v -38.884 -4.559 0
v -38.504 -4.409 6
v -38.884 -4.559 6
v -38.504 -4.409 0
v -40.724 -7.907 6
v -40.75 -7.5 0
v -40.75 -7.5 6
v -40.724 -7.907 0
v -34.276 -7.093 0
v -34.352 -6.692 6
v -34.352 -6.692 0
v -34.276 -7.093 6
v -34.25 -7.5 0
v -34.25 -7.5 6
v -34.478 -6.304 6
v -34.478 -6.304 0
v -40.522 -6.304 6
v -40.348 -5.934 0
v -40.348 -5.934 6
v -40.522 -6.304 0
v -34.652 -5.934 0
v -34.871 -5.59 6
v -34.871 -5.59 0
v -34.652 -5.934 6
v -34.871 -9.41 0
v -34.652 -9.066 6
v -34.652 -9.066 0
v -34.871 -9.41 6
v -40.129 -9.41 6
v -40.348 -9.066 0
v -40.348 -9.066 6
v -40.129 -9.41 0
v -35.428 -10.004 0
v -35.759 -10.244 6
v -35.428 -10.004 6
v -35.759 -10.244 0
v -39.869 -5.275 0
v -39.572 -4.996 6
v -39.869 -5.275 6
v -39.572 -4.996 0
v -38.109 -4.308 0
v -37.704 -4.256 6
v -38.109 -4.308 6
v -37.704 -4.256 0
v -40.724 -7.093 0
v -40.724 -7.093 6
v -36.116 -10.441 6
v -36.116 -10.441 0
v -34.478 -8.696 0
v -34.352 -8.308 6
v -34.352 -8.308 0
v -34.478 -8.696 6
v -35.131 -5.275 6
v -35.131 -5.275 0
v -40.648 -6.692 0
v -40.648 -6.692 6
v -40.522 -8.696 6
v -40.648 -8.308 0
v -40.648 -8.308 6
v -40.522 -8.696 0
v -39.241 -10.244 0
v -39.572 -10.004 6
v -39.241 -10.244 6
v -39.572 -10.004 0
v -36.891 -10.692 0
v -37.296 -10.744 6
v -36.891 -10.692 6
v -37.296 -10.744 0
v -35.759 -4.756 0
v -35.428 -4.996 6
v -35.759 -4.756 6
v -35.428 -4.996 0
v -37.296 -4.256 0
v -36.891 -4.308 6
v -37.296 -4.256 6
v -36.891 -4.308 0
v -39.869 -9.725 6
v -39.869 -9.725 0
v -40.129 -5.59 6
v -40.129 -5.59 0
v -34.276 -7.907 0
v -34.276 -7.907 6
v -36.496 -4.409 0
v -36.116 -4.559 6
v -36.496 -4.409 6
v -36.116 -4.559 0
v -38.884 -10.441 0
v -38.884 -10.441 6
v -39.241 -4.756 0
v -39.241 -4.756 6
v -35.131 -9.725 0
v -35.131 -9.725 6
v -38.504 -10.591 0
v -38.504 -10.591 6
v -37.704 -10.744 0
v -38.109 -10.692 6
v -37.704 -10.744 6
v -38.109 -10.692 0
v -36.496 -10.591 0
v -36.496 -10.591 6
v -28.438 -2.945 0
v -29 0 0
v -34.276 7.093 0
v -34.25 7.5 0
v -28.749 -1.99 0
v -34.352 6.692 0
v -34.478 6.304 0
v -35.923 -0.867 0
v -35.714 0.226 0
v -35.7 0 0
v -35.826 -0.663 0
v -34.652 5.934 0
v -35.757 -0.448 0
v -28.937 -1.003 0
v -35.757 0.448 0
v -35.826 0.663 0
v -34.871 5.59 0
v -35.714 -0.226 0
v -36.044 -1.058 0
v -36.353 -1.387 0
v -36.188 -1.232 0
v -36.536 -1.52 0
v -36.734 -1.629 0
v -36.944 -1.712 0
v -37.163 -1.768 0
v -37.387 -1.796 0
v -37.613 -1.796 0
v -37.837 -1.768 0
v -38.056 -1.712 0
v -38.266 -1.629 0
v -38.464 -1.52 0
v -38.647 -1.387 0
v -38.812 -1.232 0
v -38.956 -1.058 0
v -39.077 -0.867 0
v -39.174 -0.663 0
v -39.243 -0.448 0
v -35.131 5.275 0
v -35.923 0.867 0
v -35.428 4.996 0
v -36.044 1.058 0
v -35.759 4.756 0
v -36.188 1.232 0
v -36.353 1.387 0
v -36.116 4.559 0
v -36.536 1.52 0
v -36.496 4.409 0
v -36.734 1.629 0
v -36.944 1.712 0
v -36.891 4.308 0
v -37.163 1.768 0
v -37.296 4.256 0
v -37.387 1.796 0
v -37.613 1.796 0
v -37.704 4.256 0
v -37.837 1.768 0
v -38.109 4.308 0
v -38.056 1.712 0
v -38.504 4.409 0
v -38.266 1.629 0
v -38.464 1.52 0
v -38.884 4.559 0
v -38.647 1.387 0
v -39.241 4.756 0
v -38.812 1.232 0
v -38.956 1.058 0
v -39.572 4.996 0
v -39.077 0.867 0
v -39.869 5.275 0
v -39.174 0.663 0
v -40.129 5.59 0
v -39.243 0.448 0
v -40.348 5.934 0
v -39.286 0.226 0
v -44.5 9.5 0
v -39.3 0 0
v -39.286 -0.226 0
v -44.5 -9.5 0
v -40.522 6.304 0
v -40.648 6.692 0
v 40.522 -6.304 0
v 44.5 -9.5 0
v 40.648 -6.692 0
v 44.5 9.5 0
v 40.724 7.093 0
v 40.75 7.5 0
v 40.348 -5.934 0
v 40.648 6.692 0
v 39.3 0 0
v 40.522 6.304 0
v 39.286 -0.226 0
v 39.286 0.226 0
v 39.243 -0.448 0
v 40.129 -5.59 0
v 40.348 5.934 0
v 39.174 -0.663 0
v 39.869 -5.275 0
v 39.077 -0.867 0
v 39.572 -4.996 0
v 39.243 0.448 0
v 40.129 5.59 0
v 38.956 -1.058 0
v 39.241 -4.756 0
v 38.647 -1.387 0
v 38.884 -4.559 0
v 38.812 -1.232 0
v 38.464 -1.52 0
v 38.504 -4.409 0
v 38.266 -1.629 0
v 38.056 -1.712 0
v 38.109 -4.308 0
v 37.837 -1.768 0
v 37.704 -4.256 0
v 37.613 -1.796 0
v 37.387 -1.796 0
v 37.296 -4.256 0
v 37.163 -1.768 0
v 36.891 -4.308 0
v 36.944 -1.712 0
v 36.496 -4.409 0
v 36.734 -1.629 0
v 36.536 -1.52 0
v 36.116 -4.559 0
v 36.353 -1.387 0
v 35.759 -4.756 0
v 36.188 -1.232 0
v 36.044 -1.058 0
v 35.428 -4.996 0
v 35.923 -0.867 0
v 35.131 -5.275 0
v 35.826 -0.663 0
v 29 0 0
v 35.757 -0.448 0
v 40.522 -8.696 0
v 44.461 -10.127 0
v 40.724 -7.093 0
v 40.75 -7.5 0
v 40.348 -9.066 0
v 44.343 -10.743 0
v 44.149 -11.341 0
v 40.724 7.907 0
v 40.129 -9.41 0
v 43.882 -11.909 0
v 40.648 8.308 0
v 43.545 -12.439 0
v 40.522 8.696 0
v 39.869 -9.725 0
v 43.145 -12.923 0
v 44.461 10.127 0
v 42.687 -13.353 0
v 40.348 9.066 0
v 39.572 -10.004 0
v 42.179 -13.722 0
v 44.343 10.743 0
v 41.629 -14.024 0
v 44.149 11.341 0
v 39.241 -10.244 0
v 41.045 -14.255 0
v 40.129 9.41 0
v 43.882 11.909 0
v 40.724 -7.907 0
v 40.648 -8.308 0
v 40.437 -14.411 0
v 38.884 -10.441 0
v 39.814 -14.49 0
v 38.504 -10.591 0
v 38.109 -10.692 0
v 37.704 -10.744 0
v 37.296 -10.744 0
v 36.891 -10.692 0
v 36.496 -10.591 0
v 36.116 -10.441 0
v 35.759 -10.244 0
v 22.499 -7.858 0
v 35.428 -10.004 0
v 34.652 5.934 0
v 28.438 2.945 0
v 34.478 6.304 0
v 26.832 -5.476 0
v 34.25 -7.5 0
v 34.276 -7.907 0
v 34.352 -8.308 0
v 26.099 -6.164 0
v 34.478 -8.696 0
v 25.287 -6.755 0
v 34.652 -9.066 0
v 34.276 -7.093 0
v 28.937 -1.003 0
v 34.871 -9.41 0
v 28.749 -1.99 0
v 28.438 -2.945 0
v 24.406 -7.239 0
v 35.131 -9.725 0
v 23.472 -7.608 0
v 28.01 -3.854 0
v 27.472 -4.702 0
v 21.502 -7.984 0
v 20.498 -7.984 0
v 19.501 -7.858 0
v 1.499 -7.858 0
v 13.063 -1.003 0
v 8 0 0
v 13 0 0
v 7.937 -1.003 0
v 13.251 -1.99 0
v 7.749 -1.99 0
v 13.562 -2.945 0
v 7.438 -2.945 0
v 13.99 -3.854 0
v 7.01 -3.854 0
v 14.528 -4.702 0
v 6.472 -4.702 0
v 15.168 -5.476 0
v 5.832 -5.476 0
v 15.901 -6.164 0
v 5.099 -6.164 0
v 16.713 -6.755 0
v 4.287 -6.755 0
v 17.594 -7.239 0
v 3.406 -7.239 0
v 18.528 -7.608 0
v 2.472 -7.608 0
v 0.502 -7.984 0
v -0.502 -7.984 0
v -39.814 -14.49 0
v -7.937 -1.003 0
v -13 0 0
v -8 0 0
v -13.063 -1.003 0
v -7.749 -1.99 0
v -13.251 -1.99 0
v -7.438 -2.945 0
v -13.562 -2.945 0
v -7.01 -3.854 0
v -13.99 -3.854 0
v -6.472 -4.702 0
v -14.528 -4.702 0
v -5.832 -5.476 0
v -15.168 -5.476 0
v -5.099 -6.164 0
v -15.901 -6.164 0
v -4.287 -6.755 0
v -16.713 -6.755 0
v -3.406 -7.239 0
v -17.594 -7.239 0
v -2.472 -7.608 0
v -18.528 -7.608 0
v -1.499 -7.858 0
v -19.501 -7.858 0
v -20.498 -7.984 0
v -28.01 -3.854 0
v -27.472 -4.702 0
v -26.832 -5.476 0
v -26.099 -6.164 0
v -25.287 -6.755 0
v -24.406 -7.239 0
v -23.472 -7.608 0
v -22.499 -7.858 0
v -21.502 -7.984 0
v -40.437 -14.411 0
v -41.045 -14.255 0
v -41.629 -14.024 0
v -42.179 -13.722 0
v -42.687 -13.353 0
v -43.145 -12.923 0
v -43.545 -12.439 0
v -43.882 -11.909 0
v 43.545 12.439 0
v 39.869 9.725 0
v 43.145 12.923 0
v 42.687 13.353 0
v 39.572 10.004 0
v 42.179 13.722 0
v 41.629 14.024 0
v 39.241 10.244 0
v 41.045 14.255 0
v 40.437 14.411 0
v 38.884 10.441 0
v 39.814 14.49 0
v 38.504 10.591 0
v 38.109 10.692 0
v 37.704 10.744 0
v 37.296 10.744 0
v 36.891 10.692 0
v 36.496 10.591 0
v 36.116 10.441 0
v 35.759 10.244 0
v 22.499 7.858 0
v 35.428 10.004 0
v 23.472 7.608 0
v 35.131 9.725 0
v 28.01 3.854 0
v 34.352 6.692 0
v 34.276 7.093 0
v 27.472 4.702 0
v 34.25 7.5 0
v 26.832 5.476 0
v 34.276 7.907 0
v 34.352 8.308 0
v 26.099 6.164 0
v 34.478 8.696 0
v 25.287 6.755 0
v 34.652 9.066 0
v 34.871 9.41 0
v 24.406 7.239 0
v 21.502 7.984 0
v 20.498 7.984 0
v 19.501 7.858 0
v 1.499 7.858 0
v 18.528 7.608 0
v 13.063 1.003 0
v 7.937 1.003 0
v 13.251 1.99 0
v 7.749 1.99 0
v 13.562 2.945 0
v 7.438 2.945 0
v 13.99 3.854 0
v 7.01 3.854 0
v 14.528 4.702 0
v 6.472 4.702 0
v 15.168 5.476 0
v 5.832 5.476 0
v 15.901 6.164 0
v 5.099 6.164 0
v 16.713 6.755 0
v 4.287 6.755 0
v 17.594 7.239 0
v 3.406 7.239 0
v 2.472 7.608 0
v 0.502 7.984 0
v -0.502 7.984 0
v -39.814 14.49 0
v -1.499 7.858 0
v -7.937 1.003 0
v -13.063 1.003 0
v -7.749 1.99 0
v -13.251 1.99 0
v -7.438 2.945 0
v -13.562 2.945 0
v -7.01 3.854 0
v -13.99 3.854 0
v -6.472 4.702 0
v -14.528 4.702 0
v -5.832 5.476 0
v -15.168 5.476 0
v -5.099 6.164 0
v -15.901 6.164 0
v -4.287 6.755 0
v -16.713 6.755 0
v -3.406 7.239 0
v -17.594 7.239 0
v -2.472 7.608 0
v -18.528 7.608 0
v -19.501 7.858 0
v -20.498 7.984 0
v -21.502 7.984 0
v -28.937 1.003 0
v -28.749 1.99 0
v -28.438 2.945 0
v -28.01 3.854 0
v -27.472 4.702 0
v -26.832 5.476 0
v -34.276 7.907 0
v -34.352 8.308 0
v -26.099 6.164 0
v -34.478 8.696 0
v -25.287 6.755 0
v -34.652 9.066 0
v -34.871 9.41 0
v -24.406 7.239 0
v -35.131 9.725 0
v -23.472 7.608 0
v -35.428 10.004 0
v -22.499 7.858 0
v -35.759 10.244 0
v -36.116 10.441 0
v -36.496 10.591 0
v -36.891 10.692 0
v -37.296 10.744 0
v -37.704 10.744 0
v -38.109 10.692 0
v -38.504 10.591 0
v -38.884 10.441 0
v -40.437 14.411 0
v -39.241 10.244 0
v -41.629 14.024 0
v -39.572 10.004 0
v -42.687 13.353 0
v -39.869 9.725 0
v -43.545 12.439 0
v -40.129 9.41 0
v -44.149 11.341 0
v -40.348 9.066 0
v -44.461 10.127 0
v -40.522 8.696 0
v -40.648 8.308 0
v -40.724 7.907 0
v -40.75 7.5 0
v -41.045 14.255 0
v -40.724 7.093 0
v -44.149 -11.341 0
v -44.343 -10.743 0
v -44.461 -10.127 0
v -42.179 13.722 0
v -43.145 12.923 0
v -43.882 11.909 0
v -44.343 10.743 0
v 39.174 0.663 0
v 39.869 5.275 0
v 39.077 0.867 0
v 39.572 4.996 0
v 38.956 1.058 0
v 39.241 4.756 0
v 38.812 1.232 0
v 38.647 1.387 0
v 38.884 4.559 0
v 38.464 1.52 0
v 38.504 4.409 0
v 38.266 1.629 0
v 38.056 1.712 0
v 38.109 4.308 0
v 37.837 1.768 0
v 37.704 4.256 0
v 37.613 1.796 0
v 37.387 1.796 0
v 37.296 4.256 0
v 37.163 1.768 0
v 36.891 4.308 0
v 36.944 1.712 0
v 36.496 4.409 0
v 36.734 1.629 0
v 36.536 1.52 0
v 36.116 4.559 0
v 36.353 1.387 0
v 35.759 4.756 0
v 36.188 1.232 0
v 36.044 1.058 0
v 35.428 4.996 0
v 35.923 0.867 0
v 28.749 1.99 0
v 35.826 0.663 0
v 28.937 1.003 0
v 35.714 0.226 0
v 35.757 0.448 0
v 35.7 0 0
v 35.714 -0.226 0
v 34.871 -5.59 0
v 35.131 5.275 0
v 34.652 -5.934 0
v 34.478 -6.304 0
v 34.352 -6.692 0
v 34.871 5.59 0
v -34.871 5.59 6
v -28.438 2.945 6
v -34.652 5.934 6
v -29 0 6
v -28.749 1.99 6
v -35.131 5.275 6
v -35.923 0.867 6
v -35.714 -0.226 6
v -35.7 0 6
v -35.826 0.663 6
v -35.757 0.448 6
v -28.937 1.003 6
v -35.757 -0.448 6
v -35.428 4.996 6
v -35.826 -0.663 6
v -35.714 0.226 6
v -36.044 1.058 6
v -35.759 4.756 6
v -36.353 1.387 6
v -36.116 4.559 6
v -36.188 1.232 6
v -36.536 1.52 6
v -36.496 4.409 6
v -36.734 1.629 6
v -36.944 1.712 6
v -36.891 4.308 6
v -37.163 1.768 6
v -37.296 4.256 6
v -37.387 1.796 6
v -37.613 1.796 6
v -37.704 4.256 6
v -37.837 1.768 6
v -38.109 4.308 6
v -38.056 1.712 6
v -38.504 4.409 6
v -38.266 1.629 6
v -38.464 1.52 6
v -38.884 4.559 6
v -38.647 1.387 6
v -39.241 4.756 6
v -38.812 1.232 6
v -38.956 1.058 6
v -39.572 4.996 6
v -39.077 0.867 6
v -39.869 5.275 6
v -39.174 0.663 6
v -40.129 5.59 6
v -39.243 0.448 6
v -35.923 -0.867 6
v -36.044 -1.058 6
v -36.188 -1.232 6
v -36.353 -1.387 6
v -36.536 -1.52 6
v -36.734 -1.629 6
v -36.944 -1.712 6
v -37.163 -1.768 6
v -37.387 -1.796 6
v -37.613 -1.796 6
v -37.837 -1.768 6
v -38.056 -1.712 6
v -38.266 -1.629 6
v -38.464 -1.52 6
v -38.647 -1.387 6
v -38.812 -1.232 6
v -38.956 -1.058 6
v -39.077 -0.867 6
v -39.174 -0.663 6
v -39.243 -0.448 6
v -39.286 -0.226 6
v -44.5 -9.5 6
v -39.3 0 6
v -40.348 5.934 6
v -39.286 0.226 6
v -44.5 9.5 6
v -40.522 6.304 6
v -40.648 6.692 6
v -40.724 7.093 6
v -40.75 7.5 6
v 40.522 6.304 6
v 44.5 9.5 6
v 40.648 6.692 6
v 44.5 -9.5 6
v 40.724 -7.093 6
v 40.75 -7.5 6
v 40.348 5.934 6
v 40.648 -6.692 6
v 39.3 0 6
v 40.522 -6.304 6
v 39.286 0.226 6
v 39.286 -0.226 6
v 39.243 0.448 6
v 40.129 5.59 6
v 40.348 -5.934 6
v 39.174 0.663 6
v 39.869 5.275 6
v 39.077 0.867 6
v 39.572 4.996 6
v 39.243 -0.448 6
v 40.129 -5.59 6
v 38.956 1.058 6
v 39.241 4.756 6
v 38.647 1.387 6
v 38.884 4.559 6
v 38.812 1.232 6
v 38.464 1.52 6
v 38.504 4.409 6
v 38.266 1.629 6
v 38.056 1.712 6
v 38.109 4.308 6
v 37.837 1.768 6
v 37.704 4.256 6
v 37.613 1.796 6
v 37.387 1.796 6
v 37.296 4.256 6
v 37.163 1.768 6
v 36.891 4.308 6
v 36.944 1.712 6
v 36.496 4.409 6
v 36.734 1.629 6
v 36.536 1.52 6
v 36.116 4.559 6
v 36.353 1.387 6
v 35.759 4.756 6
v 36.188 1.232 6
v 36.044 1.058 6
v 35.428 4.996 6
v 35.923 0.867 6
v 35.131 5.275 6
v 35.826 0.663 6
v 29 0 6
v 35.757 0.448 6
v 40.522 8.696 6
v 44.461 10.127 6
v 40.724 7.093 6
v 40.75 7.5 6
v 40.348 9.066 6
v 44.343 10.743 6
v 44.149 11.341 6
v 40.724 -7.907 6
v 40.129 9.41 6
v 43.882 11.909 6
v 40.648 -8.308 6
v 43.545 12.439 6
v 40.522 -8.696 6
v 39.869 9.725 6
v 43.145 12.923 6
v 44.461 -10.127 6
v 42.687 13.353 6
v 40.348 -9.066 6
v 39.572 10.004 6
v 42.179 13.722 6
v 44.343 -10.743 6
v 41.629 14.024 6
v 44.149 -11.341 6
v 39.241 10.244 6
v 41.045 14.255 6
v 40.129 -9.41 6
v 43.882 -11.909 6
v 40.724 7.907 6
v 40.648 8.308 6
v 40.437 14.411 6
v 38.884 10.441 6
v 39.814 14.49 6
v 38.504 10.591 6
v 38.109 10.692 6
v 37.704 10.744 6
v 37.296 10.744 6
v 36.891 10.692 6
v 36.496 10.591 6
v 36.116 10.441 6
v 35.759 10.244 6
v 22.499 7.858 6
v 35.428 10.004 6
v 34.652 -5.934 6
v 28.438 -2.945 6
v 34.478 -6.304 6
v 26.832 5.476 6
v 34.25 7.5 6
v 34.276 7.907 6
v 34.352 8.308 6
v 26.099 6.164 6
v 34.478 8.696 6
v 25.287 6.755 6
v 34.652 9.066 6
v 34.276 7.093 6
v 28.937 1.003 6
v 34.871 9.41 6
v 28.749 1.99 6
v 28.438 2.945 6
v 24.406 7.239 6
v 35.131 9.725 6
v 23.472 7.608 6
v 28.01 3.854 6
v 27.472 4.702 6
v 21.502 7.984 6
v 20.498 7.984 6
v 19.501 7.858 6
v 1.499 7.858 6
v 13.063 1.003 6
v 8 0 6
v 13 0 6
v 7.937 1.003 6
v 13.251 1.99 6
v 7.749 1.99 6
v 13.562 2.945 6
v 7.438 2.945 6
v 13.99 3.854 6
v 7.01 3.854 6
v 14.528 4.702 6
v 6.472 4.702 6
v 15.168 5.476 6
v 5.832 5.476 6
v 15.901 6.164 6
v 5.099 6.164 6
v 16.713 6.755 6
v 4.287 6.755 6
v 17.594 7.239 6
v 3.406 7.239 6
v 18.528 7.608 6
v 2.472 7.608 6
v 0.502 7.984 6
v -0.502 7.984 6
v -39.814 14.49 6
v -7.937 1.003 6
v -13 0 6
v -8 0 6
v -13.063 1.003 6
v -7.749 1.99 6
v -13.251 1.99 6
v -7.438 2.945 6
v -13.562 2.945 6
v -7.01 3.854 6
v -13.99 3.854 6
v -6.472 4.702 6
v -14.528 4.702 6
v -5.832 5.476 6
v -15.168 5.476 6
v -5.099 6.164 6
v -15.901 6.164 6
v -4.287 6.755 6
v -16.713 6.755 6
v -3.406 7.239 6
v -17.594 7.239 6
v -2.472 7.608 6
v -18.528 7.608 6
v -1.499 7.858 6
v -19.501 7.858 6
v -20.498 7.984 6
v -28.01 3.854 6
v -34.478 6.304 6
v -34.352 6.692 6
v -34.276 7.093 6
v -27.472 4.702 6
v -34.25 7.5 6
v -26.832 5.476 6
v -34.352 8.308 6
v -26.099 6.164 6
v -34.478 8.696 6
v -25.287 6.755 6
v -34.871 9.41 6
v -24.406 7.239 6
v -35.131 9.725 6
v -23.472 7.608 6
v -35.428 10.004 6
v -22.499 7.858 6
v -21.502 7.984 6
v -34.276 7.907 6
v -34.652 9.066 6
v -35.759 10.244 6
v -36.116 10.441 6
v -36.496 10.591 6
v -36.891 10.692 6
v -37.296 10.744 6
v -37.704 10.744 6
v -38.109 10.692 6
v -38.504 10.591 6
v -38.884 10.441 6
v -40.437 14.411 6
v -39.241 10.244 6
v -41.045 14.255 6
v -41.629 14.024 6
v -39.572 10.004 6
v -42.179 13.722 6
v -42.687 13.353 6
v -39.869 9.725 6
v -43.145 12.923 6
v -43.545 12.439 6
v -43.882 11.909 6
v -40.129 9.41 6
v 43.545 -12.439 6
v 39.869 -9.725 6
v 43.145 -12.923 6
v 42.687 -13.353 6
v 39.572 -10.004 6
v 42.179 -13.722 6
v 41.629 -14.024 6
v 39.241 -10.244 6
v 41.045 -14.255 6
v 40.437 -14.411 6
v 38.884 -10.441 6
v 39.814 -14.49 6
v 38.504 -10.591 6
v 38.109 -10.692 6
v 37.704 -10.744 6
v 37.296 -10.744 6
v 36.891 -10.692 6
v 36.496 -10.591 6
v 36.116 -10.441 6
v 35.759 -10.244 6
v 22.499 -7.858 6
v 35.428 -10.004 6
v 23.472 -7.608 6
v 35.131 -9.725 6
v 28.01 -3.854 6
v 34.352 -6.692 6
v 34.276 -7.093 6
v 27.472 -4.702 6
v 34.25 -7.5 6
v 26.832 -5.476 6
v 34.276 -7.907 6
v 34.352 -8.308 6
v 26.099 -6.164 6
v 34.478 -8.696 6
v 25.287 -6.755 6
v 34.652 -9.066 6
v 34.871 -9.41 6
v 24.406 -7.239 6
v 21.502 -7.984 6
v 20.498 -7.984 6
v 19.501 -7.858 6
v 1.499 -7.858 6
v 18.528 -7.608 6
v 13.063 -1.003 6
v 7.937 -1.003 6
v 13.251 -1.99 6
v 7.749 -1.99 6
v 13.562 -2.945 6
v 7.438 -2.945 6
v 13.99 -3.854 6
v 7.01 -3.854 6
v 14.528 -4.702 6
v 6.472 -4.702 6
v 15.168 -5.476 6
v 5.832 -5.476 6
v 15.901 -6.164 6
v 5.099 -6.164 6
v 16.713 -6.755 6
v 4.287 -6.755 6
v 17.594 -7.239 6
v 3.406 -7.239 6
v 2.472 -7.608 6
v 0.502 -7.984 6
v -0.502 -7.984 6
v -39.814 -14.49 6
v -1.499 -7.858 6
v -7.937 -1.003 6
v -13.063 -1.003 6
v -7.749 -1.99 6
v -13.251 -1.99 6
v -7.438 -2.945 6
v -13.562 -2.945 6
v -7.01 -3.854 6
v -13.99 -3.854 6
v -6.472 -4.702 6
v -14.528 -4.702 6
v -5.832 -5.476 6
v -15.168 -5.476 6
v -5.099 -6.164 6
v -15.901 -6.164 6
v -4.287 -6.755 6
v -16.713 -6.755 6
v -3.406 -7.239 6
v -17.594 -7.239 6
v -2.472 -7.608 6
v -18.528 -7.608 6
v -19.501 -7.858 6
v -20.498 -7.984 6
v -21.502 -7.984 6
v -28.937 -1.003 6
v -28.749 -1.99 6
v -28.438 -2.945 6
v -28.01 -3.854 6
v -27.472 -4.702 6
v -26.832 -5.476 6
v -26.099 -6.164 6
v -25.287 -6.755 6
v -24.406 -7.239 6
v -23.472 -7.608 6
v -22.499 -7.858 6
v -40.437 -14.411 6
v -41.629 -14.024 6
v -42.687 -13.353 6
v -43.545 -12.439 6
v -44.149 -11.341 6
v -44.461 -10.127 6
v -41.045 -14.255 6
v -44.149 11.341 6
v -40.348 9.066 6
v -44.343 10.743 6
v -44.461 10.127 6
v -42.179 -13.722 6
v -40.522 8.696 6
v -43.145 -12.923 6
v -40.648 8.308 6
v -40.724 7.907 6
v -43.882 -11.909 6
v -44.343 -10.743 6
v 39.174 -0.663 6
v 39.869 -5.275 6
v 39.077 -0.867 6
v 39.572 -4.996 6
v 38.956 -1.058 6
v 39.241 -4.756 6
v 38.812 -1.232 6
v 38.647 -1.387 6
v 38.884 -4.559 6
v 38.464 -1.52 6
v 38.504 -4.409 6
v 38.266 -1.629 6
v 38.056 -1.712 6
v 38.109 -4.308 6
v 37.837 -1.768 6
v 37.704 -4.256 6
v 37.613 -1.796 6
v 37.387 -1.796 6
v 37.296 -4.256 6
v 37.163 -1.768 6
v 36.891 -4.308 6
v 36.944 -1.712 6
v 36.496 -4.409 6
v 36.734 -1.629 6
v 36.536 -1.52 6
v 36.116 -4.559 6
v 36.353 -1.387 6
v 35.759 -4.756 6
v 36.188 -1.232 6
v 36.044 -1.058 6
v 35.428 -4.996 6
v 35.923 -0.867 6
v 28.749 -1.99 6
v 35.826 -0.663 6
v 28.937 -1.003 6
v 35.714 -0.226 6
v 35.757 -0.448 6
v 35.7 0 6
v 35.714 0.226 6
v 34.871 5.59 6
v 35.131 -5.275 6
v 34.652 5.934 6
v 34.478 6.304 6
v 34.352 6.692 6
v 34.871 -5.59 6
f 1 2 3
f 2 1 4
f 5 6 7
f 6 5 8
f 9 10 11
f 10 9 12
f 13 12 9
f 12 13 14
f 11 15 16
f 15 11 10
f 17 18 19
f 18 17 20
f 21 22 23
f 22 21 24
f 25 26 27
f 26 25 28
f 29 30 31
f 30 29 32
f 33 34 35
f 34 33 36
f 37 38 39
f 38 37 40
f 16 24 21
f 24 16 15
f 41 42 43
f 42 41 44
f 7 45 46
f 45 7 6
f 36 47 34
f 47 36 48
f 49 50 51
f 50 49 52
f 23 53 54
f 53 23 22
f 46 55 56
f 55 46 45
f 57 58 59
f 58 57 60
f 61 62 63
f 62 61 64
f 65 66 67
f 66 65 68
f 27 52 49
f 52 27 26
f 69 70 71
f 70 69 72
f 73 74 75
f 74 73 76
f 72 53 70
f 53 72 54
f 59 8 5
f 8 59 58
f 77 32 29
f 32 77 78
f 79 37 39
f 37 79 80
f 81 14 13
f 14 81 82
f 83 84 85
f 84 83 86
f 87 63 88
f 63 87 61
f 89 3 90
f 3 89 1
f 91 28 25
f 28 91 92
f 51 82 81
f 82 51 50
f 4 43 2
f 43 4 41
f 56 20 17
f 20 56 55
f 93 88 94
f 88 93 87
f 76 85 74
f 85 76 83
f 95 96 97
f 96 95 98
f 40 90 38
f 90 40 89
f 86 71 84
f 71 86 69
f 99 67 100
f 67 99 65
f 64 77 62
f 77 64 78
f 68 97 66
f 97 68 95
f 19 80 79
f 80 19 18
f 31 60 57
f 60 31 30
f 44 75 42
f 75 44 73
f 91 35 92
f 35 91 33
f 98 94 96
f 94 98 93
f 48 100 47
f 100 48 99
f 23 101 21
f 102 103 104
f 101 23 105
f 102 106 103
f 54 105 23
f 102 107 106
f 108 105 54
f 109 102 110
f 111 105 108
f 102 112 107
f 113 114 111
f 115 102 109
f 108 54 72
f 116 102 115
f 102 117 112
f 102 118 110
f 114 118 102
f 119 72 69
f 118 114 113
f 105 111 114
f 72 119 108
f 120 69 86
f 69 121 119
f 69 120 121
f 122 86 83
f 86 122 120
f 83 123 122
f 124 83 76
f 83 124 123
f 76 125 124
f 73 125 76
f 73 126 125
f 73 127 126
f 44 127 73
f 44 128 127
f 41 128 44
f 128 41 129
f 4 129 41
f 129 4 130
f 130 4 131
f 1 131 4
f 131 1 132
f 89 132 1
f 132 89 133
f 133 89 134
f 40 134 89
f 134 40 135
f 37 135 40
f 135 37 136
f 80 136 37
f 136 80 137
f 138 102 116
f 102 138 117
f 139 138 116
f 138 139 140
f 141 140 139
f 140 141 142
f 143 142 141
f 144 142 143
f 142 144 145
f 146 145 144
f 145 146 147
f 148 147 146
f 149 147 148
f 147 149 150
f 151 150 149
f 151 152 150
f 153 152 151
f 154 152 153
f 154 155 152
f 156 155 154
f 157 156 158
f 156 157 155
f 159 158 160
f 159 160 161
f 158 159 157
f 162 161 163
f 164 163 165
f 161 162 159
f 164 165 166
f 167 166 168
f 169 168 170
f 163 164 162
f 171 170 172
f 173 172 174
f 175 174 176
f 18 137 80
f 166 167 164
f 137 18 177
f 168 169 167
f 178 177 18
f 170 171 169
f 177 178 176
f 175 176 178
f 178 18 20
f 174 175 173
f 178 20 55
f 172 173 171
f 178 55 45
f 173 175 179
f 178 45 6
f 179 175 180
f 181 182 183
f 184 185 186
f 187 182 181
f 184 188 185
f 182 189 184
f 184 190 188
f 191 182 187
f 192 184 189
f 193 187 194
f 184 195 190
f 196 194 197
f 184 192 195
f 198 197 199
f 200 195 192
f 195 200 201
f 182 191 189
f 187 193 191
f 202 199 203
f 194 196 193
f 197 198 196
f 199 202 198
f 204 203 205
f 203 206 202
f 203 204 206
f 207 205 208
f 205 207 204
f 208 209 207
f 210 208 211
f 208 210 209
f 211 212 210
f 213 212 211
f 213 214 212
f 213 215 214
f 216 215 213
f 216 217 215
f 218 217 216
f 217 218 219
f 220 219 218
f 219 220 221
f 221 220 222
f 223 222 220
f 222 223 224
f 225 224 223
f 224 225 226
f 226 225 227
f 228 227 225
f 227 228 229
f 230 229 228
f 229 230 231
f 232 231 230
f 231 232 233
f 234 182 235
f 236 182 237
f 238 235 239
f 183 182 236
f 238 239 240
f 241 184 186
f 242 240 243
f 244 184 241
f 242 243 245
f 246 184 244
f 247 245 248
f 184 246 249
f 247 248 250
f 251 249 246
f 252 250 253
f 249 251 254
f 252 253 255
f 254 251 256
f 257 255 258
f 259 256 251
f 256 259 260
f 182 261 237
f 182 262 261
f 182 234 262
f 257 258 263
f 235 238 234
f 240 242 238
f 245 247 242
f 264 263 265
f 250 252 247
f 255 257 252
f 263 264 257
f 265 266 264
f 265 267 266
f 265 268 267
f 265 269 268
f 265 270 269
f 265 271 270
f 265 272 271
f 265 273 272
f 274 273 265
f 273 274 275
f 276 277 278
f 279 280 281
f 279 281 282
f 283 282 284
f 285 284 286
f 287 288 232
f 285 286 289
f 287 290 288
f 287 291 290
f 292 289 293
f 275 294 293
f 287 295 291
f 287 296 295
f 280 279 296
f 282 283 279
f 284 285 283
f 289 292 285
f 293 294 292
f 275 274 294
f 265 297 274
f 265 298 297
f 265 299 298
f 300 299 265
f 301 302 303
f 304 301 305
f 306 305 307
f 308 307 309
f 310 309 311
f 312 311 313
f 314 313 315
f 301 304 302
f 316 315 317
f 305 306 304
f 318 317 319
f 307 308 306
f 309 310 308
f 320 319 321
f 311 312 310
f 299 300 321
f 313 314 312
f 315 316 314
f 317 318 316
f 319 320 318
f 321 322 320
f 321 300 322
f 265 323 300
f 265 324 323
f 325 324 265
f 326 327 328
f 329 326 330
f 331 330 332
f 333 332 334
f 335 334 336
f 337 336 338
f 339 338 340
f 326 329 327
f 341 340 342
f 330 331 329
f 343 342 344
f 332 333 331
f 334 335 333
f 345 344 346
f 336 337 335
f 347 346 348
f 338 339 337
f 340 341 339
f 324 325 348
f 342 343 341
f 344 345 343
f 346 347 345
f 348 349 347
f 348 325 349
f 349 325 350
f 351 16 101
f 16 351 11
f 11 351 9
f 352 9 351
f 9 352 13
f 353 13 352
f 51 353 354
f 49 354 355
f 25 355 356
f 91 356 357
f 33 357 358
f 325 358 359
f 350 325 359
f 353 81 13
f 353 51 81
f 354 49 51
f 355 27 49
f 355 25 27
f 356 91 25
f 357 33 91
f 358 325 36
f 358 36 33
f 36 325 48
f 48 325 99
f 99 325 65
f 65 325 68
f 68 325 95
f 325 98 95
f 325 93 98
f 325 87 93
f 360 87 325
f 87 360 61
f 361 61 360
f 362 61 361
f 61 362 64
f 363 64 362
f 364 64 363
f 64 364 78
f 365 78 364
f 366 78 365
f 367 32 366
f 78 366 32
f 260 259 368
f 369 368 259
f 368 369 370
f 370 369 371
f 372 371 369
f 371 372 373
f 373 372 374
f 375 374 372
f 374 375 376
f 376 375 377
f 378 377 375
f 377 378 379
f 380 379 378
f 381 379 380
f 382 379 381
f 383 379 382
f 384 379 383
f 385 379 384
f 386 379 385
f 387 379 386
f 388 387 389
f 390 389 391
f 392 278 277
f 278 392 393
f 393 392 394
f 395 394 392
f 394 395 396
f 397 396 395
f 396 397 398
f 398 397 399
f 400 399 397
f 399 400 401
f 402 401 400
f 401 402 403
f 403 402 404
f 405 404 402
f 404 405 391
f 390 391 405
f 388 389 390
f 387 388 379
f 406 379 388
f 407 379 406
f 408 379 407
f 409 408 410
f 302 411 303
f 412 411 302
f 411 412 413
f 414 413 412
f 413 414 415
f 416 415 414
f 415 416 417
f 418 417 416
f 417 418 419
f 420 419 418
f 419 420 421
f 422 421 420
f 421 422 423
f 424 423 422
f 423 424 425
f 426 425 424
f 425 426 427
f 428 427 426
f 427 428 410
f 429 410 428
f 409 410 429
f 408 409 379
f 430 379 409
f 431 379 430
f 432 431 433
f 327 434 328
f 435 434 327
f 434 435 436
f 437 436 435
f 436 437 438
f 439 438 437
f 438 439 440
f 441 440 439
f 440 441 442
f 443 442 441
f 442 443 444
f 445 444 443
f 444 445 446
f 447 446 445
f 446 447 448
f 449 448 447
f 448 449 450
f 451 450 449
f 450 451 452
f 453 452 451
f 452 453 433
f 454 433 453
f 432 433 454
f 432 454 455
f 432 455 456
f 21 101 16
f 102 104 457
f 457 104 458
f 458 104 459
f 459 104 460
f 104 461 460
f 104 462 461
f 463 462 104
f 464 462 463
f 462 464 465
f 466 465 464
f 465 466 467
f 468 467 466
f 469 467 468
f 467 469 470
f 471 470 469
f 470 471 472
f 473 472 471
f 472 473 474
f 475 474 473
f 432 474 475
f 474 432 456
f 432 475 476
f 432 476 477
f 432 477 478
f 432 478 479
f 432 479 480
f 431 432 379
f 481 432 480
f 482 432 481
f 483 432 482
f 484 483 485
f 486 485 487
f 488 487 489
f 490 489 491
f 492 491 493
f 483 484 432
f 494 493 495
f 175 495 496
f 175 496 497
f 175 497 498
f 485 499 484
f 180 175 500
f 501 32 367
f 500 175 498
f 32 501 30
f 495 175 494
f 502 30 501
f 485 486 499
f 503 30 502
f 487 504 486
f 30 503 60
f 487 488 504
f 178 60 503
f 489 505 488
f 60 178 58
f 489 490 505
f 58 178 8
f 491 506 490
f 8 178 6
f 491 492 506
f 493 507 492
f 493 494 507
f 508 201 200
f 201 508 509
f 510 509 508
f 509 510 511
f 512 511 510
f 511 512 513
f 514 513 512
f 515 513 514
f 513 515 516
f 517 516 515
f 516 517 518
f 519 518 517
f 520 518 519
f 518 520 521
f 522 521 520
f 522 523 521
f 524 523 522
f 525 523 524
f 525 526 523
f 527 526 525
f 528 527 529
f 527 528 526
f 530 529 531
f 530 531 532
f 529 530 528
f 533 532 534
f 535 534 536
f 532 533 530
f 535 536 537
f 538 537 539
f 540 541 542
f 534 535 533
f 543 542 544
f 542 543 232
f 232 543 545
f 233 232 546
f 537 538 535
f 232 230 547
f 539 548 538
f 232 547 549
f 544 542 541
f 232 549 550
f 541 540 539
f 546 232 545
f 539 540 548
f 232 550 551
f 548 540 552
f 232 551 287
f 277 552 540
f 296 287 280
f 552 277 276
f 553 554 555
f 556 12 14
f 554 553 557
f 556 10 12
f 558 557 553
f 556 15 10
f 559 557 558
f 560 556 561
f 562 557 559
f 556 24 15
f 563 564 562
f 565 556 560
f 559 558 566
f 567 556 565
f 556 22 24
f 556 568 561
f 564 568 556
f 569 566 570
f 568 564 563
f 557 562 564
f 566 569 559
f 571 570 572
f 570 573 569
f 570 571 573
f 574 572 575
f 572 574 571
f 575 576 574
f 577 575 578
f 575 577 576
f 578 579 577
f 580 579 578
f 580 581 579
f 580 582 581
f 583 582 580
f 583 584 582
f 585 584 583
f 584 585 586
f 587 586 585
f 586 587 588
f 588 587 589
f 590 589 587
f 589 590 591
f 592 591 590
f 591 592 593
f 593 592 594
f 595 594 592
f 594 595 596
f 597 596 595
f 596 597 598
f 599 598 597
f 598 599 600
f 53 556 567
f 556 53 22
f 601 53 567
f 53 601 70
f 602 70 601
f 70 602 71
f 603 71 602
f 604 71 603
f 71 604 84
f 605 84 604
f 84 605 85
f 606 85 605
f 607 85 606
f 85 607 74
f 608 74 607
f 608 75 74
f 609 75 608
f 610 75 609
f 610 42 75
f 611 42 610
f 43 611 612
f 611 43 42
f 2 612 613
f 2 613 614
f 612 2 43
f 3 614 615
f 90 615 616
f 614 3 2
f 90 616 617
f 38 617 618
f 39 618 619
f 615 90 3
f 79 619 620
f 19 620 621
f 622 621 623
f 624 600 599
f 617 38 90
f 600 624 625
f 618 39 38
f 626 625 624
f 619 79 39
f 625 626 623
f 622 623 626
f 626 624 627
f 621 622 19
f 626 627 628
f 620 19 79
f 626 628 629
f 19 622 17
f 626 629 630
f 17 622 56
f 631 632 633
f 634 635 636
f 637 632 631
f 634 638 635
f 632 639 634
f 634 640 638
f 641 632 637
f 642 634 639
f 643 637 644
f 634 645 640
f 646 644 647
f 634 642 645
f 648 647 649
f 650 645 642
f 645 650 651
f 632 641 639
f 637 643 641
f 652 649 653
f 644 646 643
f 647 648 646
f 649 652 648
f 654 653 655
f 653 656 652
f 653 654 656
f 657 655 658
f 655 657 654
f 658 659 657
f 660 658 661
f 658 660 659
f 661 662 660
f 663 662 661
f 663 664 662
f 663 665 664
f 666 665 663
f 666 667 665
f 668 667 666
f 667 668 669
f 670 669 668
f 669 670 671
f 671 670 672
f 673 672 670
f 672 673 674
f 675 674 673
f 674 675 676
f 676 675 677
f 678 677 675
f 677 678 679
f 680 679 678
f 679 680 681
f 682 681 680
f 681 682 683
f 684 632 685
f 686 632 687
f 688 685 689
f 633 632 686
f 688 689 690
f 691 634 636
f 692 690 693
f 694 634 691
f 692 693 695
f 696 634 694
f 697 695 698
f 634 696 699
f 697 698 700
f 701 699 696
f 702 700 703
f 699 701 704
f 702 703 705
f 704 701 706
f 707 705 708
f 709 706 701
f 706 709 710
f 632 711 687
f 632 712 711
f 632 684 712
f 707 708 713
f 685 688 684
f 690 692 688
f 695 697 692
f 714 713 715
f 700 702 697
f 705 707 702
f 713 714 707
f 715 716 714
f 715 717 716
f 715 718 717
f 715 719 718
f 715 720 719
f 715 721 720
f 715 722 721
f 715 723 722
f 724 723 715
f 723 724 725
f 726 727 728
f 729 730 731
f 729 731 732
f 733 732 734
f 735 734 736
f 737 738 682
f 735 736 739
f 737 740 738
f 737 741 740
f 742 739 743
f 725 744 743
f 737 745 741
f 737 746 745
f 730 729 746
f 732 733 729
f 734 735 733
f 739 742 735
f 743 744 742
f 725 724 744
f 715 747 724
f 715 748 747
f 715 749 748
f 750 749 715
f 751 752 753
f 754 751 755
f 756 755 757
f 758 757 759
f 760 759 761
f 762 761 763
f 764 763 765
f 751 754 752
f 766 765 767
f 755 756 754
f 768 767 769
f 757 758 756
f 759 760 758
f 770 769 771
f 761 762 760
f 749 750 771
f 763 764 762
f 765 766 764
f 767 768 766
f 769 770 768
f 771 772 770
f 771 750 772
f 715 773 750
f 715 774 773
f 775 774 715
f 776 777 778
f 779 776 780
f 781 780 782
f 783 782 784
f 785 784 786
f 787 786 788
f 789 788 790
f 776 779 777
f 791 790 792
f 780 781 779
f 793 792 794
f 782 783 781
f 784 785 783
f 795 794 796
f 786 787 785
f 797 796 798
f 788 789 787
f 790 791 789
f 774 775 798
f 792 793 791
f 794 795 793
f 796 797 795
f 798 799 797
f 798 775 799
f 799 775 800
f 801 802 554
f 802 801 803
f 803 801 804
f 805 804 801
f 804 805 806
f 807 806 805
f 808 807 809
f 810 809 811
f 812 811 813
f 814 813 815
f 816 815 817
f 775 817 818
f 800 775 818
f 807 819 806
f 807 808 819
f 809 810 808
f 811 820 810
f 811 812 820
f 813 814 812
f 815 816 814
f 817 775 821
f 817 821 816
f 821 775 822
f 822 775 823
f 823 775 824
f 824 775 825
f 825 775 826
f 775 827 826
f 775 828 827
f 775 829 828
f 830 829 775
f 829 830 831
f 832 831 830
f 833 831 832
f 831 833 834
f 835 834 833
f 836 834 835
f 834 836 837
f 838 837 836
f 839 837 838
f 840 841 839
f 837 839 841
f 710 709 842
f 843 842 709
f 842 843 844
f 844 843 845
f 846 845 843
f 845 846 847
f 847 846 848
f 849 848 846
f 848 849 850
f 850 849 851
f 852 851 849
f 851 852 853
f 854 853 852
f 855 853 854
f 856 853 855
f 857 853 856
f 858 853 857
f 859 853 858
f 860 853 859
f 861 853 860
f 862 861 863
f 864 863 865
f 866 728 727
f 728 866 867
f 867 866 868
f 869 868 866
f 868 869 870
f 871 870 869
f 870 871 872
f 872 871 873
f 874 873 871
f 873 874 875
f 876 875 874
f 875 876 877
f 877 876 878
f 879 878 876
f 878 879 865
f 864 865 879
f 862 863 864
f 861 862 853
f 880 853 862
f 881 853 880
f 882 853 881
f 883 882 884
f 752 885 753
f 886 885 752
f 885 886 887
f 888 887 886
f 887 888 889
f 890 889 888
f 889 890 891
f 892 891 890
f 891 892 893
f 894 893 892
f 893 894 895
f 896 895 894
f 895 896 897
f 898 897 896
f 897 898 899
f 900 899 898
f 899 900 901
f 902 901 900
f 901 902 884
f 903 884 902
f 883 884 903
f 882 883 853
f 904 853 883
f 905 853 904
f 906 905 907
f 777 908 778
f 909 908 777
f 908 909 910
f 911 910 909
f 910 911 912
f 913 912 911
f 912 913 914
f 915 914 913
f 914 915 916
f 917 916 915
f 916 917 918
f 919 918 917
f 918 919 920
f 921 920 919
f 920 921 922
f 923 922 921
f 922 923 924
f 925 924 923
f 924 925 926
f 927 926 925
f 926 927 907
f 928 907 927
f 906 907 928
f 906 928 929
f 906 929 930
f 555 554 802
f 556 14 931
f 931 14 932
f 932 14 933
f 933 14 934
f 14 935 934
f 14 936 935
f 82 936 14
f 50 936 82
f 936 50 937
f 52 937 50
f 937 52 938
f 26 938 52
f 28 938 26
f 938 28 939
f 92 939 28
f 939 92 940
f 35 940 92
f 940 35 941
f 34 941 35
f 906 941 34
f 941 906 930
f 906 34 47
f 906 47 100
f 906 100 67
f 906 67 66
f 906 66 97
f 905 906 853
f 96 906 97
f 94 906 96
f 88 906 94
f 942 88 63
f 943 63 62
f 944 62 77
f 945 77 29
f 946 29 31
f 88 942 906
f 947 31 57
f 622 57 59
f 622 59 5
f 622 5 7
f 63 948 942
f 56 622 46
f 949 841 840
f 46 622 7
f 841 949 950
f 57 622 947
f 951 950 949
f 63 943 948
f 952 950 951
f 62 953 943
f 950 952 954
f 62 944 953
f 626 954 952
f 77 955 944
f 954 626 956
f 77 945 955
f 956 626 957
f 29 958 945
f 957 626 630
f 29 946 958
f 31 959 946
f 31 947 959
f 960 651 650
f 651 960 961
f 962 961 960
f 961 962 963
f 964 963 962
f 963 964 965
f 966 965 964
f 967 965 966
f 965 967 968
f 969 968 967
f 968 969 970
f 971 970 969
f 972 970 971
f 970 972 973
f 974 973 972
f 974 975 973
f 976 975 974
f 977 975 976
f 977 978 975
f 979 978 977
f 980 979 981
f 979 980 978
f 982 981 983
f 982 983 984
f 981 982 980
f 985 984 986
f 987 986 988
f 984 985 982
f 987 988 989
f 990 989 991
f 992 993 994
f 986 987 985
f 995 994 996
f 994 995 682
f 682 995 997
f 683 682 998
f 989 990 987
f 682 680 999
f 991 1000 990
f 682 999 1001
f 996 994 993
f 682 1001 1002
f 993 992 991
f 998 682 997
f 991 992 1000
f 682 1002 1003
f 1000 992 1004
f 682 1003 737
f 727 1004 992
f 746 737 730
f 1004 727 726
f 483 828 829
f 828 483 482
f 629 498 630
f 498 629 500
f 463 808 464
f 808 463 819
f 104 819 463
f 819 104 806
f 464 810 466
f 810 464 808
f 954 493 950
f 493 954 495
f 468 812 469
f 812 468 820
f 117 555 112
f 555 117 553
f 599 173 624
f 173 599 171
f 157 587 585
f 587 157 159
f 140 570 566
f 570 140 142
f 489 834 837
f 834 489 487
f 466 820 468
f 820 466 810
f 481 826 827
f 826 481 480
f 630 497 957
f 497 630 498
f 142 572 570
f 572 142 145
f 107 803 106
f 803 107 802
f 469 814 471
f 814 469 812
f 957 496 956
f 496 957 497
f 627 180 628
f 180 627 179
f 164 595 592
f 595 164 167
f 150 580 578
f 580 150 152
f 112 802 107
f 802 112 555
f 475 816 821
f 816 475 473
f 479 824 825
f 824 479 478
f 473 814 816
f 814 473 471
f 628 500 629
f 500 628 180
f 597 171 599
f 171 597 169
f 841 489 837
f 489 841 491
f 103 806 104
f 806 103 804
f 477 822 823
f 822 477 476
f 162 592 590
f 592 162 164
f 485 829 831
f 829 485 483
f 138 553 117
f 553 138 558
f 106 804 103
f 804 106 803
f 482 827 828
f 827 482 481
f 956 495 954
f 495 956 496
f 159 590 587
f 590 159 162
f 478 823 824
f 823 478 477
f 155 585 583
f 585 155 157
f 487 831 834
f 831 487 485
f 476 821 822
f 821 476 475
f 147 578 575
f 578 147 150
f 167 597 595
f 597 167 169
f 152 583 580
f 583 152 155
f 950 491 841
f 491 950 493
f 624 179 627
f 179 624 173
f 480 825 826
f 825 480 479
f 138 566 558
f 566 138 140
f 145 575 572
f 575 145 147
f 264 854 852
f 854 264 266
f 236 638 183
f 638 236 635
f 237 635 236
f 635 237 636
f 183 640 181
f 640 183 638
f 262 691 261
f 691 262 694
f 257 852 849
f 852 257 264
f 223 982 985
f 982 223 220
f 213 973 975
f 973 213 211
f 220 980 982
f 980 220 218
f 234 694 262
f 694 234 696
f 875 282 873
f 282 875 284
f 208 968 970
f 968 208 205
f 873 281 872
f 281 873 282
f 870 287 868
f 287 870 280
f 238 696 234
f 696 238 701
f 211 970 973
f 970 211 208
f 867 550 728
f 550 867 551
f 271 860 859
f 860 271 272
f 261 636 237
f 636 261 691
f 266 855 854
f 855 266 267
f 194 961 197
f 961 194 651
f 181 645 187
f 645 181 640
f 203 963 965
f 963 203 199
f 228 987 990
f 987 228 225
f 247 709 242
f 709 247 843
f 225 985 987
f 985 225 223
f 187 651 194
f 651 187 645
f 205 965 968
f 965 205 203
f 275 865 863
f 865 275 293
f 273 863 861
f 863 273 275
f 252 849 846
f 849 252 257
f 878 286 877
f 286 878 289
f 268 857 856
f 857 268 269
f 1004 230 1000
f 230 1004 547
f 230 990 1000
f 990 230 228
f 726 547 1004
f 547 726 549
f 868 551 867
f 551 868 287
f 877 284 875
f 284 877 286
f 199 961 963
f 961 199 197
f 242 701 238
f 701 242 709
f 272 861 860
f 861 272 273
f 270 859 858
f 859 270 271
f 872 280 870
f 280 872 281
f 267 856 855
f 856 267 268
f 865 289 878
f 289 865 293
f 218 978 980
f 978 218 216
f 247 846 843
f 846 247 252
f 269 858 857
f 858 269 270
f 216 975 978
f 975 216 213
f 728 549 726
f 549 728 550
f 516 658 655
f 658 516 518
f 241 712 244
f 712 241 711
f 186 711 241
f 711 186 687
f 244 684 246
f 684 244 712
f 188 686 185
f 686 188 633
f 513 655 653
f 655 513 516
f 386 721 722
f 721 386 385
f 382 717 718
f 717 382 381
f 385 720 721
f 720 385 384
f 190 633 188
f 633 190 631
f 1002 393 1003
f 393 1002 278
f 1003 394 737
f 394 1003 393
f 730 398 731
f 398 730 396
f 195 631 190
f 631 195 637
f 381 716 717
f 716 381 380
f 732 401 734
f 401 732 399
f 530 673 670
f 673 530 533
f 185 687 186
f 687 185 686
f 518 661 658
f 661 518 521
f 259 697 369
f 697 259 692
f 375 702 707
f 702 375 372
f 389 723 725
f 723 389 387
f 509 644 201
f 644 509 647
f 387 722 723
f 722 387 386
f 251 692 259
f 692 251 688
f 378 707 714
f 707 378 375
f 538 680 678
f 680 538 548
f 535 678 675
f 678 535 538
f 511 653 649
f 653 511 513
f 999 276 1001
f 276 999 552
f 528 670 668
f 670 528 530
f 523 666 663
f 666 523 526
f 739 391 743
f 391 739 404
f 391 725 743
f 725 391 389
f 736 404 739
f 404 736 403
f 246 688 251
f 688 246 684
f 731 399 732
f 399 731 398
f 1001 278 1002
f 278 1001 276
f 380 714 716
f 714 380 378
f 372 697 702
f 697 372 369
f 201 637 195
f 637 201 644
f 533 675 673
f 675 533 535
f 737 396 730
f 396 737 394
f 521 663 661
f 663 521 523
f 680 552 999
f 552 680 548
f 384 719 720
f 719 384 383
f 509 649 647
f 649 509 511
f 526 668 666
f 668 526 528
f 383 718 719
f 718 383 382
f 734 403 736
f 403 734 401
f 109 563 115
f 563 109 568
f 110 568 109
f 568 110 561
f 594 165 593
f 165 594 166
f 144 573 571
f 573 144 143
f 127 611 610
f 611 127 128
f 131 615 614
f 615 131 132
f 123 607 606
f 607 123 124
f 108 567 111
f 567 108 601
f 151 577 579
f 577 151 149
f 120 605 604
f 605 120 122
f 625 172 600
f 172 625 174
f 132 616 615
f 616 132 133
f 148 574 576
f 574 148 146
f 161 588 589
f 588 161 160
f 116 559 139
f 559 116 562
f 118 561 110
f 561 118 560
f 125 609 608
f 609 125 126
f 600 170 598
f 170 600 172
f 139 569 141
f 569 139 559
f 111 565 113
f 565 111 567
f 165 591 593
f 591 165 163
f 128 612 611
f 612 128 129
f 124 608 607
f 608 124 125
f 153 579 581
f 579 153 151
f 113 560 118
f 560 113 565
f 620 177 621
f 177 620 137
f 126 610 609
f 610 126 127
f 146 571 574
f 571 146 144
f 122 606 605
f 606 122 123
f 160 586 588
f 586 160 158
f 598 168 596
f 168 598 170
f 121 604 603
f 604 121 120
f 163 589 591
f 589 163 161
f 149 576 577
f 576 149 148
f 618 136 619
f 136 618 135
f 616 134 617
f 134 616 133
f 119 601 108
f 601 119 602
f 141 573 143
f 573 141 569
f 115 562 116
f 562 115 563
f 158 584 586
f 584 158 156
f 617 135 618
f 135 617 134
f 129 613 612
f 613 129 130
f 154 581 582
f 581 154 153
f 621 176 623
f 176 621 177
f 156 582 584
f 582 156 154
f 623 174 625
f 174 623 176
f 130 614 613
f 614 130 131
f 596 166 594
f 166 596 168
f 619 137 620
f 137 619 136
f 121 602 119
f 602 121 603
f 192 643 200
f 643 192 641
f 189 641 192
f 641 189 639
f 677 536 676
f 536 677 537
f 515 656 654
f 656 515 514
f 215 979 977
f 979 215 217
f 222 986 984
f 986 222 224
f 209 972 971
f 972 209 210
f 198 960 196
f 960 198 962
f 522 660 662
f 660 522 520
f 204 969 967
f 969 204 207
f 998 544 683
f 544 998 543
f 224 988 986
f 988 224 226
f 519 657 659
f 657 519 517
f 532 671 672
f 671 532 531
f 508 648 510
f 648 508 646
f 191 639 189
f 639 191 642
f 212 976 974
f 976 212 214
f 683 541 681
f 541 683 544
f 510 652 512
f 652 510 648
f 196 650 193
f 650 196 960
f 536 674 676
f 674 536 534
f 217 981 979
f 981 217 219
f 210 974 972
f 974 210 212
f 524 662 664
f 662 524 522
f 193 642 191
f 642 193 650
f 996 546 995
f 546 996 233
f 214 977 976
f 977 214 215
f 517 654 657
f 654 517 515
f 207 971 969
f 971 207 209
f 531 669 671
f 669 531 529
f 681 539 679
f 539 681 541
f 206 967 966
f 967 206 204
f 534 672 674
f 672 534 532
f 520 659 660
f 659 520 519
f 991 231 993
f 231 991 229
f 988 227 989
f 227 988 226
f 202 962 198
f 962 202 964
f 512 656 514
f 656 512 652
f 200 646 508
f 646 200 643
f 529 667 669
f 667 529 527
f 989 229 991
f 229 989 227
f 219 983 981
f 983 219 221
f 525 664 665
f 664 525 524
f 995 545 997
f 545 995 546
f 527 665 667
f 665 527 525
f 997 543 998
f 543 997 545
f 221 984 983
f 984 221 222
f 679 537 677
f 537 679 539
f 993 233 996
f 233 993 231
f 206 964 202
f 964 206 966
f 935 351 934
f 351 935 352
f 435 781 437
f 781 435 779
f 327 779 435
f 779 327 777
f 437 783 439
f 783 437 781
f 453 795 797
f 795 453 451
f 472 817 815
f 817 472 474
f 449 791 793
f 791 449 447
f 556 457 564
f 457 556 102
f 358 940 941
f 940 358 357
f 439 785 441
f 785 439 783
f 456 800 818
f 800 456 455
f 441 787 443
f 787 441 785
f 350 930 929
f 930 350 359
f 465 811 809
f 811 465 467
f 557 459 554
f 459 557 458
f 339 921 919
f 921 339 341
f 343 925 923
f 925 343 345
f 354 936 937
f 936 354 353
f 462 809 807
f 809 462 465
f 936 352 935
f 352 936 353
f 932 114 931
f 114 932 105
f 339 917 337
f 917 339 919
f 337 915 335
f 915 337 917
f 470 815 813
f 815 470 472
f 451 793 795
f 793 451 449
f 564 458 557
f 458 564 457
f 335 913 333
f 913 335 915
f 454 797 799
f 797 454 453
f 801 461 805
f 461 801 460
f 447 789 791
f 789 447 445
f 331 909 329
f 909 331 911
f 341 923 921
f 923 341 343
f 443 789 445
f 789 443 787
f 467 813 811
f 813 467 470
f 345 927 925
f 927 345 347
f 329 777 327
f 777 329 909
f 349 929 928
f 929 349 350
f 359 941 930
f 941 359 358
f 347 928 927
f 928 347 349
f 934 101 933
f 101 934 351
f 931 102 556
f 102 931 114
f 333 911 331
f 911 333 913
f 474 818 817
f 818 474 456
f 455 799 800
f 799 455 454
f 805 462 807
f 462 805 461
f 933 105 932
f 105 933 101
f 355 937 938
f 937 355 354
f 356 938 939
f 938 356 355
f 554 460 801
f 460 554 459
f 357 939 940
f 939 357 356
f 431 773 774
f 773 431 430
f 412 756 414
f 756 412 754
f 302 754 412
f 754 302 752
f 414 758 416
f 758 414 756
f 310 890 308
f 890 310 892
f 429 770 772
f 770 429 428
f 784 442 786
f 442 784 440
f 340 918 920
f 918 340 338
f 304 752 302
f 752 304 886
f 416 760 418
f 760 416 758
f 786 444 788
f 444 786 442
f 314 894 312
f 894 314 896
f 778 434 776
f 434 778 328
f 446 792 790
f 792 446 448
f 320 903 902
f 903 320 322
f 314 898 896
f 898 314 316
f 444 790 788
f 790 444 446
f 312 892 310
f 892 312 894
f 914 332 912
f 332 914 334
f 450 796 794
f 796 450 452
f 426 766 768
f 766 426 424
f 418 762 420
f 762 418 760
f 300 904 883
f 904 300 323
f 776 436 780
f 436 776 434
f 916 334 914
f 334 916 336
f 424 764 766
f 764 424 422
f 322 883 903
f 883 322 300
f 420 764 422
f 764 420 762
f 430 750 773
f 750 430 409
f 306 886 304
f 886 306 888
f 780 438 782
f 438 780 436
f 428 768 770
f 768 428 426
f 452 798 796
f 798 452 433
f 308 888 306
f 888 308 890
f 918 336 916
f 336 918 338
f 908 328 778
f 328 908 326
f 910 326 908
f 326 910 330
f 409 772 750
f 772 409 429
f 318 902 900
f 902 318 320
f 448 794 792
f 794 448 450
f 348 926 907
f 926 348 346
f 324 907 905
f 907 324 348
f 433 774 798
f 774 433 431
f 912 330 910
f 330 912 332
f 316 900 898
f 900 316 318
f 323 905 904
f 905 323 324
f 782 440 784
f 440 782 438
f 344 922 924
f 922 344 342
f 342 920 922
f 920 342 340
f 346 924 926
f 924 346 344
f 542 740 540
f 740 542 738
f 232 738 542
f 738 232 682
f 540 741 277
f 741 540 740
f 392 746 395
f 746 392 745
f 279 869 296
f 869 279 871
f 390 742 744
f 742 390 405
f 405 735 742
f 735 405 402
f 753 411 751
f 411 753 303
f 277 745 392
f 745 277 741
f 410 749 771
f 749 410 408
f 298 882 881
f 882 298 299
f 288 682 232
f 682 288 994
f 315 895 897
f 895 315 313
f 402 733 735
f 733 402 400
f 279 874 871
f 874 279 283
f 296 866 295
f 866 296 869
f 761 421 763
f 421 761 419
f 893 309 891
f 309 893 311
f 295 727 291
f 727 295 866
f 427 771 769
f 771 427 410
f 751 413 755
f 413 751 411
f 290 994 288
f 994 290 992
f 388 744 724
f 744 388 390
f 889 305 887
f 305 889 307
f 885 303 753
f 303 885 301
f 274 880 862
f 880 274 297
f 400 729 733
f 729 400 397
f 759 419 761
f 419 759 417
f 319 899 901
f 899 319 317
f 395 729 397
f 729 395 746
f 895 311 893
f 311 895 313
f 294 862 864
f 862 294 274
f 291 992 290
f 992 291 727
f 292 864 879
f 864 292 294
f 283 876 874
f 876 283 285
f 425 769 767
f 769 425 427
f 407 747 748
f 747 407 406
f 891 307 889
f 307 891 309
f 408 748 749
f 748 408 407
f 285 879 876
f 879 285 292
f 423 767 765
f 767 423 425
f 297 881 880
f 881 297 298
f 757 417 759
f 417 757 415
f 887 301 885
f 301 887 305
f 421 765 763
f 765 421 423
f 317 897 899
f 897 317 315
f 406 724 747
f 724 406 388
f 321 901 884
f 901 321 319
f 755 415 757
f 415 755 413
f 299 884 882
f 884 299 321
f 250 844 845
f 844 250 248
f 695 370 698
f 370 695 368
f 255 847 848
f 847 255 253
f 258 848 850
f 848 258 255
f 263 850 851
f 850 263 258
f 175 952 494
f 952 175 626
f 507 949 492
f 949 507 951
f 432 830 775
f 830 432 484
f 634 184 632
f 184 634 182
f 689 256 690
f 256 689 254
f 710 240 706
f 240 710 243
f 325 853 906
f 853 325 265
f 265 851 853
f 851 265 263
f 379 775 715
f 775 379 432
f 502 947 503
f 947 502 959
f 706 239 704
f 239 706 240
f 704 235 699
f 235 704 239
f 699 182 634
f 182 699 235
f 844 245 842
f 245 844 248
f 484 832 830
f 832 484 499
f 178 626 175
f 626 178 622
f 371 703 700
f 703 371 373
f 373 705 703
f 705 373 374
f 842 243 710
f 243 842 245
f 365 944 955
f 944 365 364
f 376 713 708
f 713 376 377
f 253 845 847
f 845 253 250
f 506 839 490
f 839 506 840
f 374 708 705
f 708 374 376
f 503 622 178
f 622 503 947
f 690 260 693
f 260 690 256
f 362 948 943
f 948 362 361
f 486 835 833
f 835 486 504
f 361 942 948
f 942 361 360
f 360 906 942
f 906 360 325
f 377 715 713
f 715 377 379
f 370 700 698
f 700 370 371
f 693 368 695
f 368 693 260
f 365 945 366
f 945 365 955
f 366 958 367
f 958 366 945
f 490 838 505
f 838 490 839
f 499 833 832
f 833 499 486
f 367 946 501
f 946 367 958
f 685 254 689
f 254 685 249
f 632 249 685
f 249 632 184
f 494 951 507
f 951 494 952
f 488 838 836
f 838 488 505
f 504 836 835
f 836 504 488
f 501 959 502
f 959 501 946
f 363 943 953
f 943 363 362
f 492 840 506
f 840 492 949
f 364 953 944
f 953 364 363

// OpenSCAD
$fn = 50;

difference() {
	union() {
		hull() {
			translate(v = [-39.5, 9.5, 0]) {
				cylinder(h = 6, r = 5);
			}
			translate(v = [39.5, 9.5, 0]) {
				cylinder(h = 6, r = 5);
			}
			translate(v = [-39.5, -9.5, 0]) {
				cylinder(h = 6, r = 5);
			}
			translate(v = [39.5, -9.5, 0]) {
				cylinder(h = 6, r = 5);
			}
		}
	}
	union() {
		translate(v = [-37.5, -7.5, 0]) {
			cylinder(h = 6, r = 3.25);
		}
		translate(v = [-37.5, 7.5, 0]) {
			cylinder(h = 6, r = 3.25);
		}
		translate(v = [37.5, -7.5, 0]) {
			cylinder(h = 6, r = 3.25);
		}
		translate(v = [37.5, 7.5, 0]) {
			cylinder(h = 6, r = 3.25);
		}
		translate(v = [-37.5, 0.0, 0]) {
			cylinder(h = 6, r = 1.8);
		}
		translate(v = [37.5, 0.0, 0]) {
			cylinder(h = 6, r = 1.8);
		}
		translate(v = [-21.0, 0, 0.0]) {
			cylinder(h = 6, r = 8.0);
		}
		cylinder(h = 6, r = 8.0);
		translate(v = [21.0, 0, 0.0]) {
			cylinder(h = 6, r = 8.0);
		}
	}
}
